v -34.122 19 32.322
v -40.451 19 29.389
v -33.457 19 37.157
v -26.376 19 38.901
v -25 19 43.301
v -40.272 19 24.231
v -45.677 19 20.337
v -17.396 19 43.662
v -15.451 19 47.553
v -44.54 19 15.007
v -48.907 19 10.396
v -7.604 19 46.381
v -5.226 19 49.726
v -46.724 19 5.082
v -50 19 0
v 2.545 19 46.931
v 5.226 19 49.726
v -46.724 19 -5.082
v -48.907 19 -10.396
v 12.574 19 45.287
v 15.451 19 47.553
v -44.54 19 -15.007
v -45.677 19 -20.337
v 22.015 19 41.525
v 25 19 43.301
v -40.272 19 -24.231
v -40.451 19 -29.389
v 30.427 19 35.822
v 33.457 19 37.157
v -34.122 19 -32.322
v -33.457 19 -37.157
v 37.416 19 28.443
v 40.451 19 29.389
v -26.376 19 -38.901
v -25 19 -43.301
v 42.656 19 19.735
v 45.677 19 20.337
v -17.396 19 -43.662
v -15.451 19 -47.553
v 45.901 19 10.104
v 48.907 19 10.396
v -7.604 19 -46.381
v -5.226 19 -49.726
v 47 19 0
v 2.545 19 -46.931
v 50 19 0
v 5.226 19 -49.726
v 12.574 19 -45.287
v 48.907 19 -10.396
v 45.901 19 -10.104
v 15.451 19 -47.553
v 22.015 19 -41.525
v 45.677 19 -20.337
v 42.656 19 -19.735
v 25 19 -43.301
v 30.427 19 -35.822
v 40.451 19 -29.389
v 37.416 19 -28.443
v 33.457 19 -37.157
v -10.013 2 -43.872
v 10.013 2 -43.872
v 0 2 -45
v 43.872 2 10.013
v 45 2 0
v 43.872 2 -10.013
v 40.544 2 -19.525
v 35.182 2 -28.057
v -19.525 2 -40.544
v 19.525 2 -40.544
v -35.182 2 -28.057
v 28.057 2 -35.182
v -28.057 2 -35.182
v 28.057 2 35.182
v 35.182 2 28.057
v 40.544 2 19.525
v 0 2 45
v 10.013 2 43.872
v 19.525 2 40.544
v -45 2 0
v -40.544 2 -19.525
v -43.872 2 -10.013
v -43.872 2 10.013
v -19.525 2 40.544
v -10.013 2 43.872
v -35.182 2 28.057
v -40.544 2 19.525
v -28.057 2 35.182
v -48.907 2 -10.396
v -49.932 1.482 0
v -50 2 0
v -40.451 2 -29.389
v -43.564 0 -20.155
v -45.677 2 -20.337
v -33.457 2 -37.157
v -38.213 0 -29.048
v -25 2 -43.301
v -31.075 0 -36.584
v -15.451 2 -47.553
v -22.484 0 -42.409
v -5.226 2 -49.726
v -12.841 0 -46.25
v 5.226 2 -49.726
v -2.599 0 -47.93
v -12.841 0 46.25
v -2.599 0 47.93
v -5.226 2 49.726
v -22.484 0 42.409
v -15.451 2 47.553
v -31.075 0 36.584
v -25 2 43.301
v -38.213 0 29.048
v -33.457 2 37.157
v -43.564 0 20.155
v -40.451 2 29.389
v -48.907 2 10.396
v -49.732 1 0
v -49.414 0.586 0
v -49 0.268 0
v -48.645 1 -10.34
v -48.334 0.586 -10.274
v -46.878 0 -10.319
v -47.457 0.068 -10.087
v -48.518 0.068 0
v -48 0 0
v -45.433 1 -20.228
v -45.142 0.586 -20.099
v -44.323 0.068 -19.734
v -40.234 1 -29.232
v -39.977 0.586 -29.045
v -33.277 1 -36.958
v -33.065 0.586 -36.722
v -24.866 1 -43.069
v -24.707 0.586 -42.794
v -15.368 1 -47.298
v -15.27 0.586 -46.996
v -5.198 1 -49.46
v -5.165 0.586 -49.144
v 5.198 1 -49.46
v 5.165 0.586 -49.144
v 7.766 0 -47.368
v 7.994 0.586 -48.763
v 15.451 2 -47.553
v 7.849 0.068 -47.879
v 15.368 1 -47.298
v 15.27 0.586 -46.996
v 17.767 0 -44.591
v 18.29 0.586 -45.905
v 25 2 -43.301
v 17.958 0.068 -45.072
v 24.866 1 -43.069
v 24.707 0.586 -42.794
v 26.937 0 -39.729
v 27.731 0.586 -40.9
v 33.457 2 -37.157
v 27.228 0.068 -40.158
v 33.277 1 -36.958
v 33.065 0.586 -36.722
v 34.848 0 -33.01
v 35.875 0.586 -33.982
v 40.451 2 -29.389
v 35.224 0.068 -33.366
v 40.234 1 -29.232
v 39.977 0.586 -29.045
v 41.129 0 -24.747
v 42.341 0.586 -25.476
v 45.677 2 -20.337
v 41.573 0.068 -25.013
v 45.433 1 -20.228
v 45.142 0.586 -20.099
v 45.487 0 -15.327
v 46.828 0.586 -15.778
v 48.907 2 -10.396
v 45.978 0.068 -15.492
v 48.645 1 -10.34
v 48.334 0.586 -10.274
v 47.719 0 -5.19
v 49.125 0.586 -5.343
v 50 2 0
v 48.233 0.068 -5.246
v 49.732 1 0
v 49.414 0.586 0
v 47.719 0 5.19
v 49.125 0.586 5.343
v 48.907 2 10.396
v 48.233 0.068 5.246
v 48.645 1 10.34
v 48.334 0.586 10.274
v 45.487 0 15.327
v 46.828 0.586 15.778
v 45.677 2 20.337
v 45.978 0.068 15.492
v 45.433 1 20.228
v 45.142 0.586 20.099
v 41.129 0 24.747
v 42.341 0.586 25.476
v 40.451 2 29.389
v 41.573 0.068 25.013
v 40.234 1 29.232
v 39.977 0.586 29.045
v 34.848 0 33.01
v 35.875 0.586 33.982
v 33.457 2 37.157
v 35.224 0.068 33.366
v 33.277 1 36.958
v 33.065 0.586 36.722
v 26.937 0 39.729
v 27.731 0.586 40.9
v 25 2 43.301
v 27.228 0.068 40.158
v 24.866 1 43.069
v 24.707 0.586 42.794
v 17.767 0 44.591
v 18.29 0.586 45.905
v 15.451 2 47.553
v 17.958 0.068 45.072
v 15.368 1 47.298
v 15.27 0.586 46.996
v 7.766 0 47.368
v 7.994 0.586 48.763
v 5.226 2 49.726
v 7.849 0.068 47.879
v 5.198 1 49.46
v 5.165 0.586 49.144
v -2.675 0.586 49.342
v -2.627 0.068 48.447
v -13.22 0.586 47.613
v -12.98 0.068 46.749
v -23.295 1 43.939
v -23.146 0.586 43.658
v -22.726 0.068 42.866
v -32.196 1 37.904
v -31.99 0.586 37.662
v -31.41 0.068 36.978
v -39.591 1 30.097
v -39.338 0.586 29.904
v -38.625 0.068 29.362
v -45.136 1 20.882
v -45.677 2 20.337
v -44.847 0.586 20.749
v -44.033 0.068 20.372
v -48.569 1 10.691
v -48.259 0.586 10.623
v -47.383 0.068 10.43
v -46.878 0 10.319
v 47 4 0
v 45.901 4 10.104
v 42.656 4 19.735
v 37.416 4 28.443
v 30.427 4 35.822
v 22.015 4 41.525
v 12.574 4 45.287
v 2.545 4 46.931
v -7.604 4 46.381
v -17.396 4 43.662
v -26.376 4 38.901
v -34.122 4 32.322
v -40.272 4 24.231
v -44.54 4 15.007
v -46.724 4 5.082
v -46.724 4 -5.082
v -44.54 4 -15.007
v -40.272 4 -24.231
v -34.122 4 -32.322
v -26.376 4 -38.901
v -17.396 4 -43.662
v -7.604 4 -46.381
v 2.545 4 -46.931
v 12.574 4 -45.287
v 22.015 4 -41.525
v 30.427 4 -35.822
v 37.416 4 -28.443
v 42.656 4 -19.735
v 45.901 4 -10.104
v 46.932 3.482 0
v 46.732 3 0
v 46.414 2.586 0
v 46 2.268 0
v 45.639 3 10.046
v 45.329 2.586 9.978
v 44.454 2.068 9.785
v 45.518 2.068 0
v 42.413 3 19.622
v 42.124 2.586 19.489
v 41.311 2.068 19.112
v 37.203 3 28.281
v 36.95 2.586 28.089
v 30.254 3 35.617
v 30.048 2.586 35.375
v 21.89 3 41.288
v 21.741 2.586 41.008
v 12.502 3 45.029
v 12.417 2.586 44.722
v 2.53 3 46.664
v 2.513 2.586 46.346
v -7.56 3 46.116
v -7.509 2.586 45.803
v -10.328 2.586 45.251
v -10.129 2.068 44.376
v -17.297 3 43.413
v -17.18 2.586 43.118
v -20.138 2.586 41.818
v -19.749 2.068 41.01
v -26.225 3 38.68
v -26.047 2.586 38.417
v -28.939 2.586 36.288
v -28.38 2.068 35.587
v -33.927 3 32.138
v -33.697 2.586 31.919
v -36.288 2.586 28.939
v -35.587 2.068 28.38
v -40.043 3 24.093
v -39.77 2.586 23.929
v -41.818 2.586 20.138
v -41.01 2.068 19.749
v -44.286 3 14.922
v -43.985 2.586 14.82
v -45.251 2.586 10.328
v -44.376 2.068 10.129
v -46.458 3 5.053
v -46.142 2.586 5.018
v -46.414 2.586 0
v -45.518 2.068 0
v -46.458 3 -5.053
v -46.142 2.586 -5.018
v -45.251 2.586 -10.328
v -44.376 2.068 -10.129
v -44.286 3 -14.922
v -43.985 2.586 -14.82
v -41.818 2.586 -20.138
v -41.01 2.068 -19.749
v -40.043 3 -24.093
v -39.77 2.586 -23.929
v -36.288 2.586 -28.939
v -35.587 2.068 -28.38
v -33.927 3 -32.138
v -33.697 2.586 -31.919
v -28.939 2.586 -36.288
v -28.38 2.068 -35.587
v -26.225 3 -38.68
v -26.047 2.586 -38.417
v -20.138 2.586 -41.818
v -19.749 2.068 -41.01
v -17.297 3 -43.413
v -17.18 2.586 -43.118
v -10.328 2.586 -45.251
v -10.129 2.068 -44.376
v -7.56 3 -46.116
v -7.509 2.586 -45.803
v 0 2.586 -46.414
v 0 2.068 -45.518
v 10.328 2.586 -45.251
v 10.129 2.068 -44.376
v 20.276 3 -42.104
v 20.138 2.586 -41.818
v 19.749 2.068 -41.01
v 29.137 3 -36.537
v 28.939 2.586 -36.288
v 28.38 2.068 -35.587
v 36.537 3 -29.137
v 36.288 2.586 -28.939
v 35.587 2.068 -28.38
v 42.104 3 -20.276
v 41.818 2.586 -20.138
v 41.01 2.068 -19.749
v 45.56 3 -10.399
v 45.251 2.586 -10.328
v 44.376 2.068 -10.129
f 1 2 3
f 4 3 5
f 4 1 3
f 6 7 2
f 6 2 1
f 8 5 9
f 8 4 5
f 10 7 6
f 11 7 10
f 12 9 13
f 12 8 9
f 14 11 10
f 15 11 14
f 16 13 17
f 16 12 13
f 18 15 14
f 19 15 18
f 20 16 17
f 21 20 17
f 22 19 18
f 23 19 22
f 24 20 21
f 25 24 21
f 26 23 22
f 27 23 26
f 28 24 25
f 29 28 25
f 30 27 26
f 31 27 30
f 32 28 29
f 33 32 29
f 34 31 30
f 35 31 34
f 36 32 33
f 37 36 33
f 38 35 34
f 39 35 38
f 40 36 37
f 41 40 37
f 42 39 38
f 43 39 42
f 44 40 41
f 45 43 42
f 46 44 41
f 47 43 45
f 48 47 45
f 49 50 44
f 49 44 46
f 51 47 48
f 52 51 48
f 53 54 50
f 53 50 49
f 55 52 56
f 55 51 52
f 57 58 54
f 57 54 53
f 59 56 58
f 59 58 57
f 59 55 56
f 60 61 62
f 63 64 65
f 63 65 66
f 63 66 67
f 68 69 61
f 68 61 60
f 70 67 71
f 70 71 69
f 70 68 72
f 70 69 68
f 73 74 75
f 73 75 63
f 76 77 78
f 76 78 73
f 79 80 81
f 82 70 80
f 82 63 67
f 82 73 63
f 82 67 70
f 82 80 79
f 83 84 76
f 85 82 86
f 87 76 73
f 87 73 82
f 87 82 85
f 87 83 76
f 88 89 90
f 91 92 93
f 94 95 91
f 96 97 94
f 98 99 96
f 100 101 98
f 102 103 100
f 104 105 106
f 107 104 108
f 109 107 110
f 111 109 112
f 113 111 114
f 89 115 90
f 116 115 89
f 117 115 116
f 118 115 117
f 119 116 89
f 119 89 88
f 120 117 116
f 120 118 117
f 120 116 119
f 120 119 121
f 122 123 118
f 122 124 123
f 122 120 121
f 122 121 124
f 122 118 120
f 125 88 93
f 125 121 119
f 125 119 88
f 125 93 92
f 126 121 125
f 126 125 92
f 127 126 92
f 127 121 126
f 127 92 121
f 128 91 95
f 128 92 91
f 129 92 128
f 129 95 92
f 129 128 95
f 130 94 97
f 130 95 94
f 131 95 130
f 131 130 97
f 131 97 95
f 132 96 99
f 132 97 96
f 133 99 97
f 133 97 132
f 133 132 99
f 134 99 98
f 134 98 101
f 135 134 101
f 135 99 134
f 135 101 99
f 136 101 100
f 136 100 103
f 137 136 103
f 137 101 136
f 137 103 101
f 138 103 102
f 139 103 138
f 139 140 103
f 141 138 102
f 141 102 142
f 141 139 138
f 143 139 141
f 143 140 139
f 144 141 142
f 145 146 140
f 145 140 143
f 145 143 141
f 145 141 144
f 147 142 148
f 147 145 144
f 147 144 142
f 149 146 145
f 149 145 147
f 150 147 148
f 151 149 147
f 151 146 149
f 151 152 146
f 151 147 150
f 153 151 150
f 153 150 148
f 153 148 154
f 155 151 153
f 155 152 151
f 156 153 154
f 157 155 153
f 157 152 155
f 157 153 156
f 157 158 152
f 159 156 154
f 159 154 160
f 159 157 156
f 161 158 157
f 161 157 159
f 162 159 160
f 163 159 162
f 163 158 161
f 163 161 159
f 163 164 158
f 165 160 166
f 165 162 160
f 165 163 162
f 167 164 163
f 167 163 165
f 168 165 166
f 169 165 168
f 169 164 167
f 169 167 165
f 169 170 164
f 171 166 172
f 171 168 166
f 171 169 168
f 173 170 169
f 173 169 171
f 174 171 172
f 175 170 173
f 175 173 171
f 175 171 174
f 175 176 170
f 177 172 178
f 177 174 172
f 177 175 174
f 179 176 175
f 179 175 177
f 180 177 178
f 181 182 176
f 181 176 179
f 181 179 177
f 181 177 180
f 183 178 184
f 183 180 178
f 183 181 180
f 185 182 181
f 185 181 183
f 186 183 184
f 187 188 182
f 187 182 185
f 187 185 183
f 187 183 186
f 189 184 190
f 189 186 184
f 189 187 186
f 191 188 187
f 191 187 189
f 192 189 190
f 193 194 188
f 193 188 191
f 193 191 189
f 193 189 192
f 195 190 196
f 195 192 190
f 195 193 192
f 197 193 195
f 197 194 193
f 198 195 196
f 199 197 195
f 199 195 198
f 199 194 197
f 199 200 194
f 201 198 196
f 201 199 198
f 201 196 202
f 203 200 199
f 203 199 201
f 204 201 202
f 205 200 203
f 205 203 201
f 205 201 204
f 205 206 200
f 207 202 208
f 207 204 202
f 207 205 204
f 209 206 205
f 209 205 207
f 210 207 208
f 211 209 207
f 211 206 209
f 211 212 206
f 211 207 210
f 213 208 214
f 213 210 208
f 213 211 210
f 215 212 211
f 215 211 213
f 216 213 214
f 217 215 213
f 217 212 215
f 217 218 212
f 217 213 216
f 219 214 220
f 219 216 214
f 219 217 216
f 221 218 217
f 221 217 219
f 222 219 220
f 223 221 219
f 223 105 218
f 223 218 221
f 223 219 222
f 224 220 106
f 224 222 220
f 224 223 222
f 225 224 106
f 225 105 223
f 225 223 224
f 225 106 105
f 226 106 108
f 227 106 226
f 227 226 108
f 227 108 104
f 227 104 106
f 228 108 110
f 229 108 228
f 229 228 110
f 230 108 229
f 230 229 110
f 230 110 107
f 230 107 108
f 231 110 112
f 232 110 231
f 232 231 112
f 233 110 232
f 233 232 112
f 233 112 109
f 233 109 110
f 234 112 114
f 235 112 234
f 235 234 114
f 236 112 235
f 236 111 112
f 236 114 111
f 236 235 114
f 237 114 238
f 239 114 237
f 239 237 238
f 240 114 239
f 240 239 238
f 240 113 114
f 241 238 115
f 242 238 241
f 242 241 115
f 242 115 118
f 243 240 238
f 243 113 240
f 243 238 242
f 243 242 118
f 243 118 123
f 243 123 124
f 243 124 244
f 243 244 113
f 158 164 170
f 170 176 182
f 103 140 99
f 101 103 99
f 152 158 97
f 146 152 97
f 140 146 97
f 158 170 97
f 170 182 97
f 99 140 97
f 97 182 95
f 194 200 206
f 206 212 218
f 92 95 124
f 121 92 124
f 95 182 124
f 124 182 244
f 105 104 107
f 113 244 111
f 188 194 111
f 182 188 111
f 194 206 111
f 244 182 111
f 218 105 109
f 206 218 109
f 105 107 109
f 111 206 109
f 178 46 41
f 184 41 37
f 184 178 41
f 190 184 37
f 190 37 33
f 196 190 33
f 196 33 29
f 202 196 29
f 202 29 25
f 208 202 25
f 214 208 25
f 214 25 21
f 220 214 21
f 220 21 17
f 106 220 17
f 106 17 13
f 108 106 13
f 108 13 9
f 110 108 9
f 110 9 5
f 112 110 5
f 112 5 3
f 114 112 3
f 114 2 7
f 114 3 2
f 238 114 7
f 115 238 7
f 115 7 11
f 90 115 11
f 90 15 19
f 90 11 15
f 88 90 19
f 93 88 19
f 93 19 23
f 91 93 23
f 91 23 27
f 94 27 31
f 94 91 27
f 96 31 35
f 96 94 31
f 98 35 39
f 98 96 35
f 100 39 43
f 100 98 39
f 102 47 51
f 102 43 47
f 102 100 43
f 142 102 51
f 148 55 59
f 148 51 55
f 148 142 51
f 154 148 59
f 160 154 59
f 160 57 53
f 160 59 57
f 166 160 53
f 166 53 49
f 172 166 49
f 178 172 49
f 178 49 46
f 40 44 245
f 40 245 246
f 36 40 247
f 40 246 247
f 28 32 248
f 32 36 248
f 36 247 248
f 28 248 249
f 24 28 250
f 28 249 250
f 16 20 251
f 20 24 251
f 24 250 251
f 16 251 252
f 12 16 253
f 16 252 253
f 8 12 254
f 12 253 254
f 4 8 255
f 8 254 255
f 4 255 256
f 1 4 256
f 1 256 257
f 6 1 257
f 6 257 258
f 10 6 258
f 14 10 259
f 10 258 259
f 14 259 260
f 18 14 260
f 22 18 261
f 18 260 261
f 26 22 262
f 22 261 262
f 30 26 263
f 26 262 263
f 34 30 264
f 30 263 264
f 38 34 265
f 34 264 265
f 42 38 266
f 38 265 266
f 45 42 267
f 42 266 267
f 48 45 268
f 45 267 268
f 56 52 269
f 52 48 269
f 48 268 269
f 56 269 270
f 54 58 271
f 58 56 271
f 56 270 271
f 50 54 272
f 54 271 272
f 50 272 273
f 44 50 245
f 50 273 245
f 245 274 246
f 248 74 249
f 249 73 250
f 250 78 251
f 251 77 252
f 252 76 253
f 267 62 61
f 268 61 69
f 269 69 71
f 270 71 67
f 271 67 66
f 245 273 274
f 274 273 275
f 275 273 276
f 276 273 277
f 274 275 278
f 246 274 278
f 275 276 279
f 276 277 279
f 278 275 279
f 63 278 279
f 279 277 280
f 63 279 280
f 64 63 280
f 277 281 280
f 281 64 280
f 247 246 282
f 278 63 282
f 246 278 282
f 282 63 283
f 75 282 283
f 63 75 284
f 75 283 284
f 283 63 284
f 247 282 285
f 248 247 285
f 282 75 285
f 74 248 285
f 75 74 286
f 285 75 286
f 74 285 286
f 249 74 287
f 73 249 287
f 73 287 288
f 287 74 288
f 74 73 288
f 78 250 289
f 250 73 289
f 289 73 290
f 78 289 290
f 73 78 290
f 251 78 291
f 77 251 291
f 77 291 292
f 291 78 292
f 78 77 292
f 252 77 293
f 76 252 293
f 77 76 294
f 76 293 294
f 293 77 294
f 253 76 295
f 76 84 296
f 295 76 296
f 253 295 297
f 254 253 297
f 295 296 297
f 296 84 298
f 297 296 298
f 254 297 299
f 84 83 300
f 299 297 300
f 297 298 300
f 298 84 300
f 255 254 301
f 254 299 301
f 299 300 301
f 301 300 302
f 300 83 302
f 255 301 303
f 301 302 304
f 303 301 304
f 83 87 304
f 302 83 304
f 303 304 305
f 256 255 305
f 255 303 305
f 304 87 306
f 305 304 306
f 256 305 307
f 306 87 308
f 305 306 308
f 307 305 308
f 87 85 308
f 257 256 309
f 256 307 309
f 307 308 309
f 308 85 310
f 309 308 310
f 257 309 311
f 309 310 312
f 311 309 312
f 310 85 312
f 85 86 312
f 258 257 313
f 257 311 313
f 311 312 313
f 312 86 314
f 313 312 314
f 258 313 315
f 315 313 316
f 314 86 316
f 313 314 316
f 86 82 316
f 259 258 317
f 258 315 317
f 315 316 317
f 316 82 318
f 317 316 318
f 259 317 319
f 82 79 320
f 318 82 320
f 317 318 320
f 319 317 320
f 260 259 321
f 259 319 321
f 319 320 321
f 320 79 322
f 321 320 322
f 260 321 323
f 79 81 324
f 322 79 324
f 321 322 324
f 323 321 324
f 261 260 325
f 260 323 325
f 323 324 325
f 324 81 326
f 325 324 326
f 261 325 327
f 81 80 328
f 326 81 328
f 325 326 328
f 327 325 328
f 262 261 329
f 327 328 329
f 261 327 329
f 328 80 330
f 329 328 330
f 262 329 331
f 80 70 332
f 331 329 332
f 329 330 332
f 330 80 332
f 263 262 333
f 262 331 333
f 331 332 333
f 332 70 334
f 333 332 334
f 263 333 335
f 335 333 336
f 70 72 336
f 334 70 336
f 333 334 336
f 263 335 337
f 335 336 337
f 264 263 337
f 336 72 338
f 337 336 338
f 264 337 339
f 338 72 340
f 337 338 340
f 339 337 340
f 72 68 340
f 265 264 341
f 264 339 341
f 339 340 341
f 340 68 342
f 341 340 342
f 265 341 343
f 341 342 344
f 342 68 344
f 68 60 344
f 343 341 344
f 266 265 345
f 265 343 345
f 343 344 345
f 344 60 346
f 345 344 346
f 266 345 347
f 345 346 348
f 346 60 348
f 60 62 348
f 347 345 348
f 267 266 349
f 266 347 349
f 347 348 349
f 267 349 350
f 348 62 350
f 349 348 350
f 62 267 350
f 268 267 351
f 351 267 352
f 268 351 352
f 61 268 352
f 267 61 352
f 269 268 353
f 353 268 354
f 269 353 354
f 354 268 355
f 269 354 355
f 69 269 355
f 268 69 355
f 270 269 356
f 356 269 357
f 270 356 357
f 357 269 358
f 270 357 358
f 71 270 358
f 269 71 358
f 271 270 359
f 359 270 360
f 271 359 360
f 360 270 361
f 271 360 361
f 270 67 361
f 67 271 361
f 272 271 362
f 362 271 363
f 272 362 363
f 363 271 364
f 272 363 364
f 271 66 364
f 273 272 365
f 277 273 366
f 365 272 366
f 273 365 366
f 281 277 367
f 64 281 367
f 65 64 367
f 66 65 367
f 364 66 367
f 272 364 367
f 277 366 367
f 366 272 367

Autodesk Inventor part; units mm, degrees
ref_plane "YZ Plane" through (0, 0, 0) normal (1, 0, 0) x (0, 1, 0)
ref_plane "XZ Plane" through (0, 0, 0) normal (0, 1, 0) x (-1, 0, 0)
ref_plane "XY Plane" through (0, 0, 0) normal (0, 0, 1) x (1, 0, 0)
sketch "Sketch1" plane through (0, 0, 0) normal (0, 1, 0) x (-1, 0, 0)
  line L0 (-50, -50) -> (50, -50) construction
  line L1 (50, -50) -> (50, 50) construction
  line L2 (50, 50) -> (-50, 50) construction
  line L3 (-50, 50) -> (-50, -50) construction
  line L4 (-50, -50) -> (50, 50) construction
  line L5 (50, -50) -> (-50, 50) construction
  circle A0 centre (0, 0) radius 50
  dimension "d0" = 100
  dimension "d8" = 100
extrude "Extrusion1" add sketch "Sketch1" along normal blind 2
sketch "Sketch2" plane through (0, 2, 0) normal (0, 1, 0) x (1, 0, 0)
  circle A0 centre (0, 0) radius 50 projected
  circle A1 centre (0, 0) radius 47
  dimension "d9" = 3
extrude "Extrusion2" add sketch "Sketch2" along normal blind 17
fillet "Fillet1" radius 2 2 edges at (-47, 2, 0) (50, 0, 0)
properties part number "Petri"
